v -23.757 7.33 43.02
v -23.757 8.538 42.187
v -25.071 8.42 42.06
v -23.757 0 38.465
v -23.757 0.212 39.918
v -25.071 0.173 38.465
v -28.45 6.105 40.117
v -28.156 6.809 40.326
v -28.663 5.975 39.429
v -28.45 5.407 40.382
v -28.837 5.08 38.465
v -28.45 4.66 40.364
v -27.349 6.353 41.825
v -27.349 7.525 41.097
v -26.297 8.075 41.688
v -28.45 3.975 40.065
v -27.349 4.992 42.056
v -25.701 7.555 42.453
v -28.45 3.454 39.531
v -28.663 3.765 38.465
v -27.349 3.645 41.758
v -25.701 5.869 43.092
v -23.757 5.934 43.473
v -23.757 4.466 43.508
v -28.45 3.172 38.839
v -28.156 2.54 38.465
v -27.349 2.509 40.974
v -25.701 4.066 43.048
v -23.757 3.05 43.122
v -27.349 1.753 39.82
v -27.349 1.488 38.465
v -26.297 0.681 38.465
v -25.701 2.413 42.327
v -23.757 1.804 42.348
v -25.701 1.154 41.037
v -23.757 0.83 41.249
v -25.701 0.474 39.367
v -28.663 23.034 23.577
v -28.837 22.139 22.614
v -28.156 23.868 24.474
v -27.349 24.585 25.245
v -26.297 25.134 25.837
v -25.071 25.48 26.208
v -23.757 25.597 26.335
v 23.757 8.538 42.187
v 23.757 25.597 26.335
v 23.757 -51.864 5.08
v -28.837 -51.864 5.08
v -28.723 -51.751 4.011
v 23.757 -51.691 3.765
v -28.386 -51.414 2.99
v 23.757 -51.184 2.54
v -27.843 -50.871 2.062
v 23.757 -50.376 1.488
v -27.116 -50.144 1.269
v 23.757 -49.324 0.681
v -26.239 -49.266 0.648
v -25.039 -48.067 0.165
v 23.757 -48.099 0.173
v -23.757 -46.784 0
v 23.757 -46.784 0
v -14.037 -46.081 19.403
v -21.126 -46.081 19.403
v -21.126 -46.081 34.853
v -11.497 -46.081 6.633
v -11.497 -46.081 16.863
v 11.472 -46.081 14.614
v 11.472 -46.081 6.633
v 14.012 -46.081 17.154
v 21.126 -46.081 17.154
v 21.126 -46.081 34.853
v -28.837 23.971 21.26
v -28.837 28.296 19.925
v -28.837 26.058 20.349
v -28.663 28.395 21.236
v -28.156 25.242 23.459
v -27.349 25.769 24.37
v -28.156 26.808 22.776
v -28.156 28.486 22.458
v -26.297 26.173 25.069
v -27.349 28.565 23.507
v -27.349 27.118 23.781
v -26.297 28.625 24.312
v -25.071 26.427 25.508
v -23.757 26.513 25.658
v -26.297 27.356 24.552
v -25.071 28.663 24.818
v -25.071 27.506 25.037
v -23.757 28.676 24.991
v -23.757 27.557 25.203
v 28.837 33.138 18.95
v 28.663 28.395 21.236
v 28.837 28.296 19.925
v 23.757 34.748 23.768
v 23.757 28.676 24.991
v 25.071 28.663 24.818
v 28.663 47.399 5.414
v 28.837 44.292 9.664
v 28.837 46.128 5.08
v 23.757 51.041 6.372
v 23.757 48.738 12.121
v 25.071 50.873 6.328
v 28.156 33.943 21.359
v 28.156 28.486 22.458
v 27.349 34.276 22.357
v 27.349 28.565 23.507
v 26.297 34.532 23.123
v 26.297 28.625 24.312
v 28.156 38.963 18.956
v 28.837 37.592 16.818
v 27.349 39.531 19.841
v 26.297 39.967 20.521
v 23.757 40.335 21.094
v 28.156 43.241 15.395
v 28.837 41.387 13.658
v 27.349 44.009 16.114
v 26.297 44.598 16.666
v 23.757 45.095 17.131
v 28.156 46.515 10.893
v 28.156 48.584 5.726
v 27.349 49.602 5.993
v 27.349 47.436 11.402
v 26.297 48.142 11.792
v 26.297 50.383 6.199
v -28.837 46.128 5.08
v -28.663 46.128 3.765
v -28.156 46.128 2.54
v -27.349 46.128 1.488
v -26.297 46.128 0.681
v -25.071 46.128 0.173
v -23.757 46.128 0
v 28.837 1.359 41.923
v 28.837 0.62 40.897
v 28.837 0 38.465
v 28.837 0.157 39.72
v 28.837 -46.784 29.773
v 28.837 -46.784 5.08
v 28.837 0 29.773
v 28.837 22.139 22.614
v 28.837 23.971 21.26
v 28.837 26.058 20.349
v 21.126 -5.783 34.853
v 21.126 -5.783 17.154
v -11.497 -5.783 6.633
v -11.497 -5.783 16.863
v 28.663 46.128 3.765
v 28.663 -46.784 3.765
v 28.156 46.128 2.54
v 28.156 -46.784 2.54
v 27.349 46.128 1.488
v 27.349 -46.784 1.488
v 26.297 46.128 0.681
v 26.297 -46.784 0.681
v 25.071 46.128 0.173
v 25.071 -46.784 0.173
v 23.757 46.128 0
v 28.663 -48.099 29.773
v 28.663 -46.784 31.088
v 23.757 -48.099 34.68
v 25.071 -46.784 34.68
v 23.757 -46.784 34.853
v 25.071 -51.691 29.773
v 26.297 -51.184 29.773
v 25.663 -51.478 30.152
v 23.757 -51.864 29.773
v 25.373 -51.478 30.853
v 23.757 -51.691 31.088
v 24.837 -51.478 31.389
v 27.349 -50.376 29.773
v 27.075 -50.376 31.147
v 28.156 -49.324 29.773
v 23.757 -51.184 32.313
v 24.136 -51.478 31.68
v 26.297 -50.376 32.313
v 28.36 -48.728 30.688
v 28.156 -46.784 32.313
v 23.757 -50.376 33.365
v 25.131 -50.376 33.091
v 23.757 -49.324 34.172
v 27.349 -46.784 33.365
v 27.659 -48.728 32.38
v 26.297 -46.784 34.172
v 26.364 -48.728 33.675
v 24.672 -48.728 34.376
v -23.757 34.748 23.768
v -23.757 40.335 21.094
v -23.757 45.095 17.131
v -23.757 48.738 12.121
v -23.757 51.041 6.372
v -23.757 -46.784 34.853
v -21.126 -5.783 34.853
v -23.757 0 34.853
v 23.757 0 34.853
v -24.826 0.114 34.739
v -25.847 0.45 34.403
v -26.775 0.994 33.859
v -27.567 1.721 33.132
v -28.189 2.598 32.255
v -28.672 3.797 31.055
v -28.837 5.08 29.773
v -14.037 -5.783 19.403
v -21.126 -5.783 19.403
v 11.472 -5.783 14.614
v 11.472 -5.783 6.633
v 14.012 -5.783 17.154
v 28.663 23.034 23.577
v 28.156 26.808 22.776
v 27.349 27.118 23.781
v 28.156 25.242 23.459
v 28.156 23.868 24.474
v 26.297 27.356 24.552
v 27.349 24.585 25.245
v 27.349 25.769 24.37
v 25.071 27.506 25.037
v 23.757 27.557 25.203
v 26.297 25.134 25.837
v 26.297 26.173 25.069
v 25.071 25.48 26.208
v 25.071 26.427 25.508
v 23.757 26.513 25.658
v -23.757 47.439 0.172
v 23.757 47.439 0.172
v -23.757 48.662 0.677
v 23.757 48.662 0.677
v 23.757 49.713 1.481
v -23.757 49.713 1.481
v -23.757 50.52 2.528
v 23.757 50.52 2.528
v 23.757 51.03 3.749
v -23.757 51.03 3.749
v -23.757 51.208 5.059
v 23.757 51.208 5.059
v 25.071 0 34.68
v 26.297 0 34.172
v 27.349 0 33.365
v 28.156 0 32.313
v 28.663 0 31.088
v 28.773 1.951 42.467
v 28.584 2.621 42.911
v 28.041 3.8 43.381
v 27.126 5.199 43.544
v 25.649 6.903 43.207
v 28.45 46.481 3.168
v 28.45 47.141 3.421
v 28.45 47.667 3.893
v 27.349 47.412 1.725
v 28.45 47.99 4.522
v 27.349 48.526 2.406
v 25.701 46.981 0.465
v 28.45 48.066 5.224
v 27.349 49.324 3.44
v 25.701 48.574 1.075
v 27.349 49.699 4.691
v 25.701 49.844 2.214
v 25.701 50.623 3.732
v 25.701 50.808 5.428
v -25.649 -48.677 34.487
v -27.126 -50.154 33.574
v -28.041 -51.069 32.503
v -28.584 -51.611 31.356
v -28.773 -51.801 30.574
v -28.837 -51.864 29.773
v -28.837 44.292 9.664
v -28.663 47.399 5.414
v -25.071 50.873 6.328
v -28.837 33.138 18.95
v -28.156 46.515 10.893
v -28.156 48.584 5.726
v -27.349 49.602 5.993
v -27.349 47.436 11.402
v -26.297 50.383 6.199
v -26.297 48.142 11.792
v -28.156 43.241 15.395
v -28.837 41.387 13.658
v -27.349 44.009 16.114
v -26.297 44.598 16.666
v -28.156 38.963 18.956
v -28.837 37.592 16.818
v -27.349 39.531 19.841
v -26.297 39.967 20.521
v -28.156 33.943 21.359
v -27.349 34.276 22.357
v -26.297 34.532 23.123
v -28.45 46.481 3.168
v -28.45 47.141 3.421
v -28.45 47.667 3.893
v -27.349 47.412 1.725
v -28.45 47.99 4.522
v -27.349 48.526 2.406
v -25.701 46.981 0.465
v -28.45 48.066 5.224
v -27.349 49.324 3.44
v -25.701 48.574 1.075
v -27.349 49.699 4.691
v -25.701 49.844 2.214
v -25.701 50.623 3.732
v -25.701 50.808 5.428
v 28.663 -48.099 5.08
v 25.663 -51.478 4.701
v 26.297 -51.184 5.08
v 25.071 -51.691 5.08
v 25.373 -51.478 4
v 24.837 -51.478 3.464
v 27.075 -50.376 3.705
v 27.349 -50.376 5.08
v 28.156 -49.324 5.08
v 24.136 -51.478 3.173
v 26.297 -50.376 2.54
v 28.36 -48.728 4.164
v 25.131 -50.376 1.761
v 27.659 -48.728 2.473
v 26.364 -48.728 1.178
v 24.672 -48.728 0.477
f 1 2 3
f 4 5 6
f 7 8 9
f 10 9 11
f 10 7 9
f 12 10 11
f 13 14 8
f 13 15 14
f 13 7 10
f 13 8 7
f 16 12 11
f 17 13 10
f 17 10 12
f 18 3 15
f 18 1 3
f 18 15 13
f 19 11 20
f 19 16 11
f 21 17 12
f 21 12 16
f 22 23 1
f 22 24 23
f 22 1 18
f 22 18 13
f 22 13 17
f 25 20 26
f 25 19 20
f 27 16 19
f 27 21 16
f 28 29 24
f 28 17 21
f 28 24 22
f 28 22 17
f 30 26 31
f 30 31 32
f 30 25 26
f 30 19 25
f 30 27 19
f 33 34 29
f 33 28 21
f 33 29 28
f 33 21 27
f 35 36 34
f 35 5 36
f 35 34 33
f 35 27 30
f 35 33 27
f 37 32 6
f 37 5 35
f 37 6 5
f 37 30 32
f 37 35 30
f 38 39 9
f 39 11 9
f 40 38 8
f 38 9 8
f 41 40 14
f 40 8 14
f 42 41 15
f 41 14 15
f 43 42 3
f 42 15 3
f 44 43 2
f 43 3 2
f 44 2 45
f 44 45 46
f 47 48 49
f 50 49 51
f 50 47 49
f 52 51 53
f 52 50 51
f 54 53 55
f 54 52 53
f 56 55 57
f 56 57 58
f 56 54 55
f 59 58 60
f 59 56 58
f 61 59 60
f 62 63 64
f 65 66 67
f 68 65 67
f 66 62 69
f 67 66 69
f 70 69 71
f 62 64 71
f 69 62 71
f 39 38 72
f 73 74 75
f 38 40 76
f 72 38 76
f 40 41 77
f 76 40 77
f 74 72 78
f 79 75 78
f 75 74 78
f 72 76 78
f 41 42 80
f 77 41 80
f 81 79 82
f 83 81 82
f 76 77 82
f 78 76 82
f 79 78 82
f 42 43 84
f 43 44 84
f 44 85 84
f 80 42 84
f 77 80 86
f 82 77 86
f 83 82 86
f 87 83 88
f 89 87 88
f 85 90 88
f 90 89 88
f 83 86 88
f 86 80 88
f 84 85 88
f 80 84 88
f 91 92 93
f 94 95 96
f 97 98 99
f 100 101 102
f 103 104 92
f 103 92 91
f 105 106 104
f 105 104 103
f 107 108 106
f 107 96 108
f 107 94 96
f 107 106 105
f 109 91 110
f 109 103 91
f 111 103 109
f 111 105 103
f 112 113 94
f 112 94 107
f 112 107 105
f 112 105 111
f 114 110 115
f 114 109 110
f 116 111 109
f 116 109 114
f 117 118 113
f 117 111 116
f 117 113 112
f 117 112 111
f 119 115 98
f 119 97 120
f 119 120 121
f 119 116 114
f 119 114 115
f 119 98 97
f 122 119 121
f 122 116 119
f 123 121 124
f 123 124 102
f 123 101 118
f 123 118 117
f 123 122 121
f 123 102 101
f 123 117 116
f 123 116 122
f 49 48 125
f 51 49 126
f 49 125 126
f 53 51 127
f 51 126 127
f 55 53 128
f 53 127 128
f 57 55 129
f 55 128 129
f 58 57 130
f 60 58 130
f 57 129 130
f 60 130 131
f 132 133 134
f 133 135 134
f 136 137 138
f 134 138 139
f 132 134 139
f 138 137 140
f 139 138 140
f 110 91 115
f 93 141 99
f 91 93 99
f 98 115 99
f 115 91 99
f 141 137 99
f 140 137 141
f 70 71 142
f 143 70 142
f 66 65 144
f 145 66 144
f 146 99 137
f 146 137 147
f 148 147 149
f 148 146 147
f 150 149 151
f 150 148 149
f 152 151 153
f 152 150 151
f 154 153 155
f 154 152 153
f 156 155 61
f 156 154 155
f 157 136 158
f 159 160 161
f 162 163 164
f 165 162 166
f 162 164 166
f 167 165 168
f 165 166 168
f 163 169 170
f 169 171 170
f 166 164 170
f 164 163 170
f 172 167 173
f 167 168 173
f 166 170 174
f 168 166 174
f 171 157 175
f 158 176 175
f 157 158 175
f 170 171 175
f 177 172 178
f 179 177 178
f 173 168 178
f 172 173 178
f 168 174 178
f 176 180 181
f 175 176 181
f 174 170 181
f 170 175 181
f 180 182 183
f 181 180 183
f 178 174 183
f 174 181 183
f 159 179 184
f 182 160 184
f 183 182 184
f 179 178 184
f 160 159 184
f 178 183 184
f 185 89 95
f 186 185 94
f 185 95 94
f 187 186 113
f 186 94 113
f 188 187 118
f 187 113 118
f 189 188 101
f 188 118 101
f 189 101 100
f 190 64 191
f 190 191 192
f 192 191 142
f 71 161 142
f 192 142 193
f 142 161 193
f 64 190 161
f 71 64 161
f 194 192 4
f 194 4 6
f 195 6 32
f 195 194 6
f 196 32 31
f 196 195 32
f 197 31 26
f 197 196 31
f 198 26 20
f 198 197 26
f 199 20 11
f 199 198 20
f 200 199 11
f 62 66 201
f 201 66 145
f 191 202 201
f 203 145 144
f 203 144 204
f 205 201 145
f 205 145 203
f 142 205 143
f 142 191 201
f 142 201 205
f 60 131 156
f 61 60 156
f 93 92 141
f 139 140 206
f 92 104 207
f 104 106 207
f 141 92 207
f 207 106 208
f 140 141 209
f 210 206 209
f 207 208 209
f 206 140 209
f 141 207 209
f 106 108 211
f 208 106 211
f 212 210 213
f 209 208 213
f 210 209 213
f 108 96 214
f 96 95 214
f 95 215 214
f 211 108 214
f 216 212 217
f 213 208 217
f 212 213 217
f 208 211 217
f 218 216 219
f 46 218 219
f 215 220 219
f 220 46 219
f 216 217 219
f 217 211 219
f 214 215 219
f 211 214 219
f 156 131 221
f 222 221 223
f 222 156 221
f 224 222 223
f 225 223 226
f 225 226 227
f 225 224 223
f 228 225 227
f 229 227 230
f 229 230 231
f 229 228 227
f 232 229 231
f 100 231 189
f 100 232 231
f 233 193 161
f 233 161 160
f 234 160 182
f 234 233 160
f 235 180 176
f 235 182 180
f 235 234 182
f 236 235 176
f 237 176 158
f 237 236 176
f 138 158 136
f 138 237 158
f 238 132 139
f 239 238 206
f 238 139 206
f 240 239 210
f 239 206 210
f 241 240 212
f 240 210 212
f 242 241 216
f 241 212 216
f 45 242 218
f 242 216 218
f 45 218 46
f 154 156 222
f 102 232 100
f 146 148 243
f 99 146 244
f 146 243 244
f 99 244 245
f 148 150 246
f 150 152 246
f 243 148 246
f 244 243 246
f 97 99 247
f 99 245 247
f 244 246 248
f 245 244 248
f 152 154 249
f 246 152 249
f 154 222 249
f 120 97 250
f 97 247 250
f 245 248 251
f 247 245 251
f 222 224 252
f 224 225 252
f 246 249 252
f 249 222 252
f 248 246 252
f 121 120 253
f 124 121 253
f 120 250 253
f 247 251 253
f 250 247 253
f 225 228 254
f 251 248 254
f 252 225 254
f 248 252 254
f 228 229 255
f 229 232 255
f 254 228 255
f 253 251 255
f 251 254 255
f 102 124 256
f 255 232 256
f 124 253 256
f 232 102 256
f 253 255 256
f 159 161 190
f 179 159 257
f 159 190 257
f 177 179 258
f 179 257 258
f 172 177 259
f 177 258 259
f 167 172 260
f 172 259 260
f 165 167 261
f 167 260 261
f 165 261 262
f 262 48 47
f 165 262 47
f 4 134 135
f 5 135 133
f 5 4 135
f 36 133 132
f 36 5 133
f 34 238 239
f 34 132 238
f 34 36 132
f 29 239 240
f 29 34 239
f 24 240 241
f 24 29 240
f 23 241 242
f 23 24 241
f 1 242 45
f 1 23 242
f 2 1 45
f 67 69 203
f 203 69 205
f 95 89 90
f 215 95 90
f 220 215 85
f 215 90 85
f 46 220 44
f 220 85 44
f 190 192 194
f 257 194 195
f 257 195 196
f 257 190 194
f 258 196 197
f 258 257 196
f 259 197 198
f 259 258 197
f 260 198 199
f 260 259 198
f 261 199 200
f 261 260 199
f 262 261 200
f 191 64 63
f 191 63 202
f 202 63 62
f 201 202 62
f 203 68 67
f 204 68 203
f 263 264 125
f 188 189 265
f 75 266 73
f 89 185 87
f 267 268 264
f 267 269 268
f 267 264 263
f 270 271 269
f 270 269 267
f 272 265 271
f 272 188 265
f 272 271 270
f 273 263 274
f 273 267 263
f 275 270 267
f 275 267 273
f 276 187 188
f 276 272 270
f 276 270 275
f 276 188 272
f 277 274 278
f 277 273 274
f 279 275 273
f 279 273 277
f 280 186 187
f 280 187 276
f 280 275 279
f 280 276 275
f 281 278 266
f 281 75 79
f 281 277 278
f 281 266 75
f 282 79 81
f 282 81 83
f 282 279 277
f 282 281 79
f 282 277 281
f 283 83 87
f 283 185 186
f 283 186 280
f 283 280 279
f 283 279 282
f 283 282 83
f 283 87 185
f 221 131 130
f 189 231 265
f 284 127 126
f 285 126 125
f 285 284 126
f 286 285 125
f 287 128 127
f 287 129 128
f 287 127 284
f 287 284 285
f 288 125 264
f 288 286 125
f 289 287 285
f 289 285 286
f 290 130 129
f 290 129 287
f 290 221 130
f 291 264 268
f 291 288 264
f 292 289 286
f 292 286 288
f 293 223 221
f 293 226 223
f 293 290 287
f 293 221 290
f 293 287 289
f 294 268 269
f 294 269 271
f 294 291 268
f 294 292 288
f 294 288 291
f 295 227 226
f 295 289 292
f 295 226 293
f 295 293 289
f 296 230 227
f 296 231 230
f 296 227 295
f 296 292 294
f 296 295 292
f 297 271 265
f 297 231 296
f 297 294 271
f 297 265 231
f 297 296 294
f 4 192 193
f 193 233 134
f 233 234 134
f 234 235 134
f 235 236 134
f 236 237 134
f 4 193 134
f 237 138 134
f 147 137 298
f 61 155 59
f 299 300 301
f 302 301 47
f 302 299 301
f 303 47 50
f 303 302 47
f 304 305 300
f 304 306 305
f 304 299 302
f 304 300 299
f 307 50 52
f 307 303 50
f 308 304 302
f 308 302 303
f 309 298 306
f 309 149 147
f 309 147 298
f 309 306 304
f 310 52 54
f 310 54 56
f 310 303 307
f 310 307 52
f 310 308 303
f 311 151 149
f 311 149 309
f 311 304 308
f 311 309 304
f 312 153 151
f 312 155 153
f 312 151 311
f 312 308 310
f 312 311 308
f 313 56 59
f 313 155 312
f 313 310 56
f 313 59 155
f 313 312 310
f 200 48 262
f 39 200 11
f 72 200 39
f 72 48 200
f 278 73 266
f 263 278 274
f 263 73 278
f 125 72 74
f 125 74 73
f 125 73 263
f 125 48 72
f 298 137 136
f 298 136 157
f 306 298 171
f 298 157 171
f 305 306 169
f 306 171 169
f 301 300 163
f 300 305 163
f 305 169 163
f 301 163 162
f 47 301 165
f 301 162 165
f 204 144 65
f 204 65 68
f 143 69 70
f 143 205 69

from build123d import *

# Parameters (mm, degrees)
F0_W     = 57.6730370522
F0_H     = 103.7285923958
F1_DEPTH = 50.1204133034
F2_W     = 51.8642961979
F2_H     = 15.2675881982
F3_DEPTH = 280.9666395187
F4_W     = 42.251765728
F4_H     = 40.2974346653
F5_DEPTH = 28.219755739
F6_W     = 9.6290325746
F6_H     = 40.2974346653
F7_DEPTH = 12.7694699913
F8_W     = 9.6542518586
F8_H     = 40.2974346653
F9_DEPTH = 10.5208531022
F10_R    = 5.08
F11_SIZE = 2.54


with BuildPart() as f1:
    # F0 (on Top) → F1 (new body)
    with BuildSketch(Plane.XY):
        Rectangle(F0_W, F0_H)
    extrude(amount=F1_DEPTH)

    # F2 (on face) → F3 (cut)
    with BuildSketch(Plane.YZ.offset(28.8365185261)):
        with BuildLine():
            ThreePointArc((26.9694030285, 25.0602066517), (44.5827153367, 17.6618916268), (51.8642961979, 0))
            Line((51.8642961979, 0), (51.8642961979, 50.1204133034))
            Line((51.8642961979, 50.1204133034), (0, 50.1204133034))
            Line((0, 50.1204133034), (26.9694030285, 25.0602066517))
        make_face()
        with Locations((-25.9321480989, 42.4866192043)):
            Rectangle(F2_W, F2_H)
    extrude(amount=-F3_DEPTH, mode=Mode.SUBTRACT)

    # F4 (on face) → F5 (cut)
    with BuildSketch(Plane.XY.offset(34.8528251052)):
        with Locations((0, -25.9321480989)):
            Rectangle(F4_W, F4_H)
    extrude(amount=-F5_DEPTH, mode=Mode.SUBTRACT)

    # F6 (on face) → F7 (join)
    with BuildSketch(Plane.XY.offset(6.6330693662)):
        with Locations((-16.3113665767, -25.9321480989)):
            Rectangle(F6_W, F6_H)
    extrude(amount=F7_DEPTH)

    # F8 (on face) → F9 (join)
    with BuildSketch(Plane.XY.offset(6.6330693662)):
        with Locations((16.2987569347, -25.9321480989)):
            Rectangle(F8_W, F8_H)
    extrude(amount=F9_DEPTH)

    # F10
    f10_edges = [f1.edges().sort_by_distance(p)[0] for p in [
        (28.836519, 44.582715, 17.661892),
        (28.836519, 13.484702, 37.59031),
        (0, 26.969403, 25.060207),
        (-28.836519, 13.484702, 37.59031),
        (-28.836519, 44.582715, 17.661892),
        (0, 51.864296, 0),
        (28.836519, 0, 0),
        (28.836519, -25.932148, 34.852825),
        (28.836519, -51.864296, 17.426413),
        (-28.836519, -25.932148, 34.852825),
        (0, -51.864296, 34.852825),
        (0, -51.864296, 0),
        (-28.836519, 0, 0),
        (-28.836519, 0, 42.486619),
        (0, 0, 50.120413),
    ]]
    fillet(f10_edges, radius=F10_R)

    # F11
    f11_edges = [f1.edges().sort_by_distance(p)[0] for p in [
        (-11.49685, -25.932148, 19.402539),
        (11.471631, -25.932148, 17.153922),
    ]]
    chamfer(f11_edges, length=F11_SIZE)


solid = f1.part
